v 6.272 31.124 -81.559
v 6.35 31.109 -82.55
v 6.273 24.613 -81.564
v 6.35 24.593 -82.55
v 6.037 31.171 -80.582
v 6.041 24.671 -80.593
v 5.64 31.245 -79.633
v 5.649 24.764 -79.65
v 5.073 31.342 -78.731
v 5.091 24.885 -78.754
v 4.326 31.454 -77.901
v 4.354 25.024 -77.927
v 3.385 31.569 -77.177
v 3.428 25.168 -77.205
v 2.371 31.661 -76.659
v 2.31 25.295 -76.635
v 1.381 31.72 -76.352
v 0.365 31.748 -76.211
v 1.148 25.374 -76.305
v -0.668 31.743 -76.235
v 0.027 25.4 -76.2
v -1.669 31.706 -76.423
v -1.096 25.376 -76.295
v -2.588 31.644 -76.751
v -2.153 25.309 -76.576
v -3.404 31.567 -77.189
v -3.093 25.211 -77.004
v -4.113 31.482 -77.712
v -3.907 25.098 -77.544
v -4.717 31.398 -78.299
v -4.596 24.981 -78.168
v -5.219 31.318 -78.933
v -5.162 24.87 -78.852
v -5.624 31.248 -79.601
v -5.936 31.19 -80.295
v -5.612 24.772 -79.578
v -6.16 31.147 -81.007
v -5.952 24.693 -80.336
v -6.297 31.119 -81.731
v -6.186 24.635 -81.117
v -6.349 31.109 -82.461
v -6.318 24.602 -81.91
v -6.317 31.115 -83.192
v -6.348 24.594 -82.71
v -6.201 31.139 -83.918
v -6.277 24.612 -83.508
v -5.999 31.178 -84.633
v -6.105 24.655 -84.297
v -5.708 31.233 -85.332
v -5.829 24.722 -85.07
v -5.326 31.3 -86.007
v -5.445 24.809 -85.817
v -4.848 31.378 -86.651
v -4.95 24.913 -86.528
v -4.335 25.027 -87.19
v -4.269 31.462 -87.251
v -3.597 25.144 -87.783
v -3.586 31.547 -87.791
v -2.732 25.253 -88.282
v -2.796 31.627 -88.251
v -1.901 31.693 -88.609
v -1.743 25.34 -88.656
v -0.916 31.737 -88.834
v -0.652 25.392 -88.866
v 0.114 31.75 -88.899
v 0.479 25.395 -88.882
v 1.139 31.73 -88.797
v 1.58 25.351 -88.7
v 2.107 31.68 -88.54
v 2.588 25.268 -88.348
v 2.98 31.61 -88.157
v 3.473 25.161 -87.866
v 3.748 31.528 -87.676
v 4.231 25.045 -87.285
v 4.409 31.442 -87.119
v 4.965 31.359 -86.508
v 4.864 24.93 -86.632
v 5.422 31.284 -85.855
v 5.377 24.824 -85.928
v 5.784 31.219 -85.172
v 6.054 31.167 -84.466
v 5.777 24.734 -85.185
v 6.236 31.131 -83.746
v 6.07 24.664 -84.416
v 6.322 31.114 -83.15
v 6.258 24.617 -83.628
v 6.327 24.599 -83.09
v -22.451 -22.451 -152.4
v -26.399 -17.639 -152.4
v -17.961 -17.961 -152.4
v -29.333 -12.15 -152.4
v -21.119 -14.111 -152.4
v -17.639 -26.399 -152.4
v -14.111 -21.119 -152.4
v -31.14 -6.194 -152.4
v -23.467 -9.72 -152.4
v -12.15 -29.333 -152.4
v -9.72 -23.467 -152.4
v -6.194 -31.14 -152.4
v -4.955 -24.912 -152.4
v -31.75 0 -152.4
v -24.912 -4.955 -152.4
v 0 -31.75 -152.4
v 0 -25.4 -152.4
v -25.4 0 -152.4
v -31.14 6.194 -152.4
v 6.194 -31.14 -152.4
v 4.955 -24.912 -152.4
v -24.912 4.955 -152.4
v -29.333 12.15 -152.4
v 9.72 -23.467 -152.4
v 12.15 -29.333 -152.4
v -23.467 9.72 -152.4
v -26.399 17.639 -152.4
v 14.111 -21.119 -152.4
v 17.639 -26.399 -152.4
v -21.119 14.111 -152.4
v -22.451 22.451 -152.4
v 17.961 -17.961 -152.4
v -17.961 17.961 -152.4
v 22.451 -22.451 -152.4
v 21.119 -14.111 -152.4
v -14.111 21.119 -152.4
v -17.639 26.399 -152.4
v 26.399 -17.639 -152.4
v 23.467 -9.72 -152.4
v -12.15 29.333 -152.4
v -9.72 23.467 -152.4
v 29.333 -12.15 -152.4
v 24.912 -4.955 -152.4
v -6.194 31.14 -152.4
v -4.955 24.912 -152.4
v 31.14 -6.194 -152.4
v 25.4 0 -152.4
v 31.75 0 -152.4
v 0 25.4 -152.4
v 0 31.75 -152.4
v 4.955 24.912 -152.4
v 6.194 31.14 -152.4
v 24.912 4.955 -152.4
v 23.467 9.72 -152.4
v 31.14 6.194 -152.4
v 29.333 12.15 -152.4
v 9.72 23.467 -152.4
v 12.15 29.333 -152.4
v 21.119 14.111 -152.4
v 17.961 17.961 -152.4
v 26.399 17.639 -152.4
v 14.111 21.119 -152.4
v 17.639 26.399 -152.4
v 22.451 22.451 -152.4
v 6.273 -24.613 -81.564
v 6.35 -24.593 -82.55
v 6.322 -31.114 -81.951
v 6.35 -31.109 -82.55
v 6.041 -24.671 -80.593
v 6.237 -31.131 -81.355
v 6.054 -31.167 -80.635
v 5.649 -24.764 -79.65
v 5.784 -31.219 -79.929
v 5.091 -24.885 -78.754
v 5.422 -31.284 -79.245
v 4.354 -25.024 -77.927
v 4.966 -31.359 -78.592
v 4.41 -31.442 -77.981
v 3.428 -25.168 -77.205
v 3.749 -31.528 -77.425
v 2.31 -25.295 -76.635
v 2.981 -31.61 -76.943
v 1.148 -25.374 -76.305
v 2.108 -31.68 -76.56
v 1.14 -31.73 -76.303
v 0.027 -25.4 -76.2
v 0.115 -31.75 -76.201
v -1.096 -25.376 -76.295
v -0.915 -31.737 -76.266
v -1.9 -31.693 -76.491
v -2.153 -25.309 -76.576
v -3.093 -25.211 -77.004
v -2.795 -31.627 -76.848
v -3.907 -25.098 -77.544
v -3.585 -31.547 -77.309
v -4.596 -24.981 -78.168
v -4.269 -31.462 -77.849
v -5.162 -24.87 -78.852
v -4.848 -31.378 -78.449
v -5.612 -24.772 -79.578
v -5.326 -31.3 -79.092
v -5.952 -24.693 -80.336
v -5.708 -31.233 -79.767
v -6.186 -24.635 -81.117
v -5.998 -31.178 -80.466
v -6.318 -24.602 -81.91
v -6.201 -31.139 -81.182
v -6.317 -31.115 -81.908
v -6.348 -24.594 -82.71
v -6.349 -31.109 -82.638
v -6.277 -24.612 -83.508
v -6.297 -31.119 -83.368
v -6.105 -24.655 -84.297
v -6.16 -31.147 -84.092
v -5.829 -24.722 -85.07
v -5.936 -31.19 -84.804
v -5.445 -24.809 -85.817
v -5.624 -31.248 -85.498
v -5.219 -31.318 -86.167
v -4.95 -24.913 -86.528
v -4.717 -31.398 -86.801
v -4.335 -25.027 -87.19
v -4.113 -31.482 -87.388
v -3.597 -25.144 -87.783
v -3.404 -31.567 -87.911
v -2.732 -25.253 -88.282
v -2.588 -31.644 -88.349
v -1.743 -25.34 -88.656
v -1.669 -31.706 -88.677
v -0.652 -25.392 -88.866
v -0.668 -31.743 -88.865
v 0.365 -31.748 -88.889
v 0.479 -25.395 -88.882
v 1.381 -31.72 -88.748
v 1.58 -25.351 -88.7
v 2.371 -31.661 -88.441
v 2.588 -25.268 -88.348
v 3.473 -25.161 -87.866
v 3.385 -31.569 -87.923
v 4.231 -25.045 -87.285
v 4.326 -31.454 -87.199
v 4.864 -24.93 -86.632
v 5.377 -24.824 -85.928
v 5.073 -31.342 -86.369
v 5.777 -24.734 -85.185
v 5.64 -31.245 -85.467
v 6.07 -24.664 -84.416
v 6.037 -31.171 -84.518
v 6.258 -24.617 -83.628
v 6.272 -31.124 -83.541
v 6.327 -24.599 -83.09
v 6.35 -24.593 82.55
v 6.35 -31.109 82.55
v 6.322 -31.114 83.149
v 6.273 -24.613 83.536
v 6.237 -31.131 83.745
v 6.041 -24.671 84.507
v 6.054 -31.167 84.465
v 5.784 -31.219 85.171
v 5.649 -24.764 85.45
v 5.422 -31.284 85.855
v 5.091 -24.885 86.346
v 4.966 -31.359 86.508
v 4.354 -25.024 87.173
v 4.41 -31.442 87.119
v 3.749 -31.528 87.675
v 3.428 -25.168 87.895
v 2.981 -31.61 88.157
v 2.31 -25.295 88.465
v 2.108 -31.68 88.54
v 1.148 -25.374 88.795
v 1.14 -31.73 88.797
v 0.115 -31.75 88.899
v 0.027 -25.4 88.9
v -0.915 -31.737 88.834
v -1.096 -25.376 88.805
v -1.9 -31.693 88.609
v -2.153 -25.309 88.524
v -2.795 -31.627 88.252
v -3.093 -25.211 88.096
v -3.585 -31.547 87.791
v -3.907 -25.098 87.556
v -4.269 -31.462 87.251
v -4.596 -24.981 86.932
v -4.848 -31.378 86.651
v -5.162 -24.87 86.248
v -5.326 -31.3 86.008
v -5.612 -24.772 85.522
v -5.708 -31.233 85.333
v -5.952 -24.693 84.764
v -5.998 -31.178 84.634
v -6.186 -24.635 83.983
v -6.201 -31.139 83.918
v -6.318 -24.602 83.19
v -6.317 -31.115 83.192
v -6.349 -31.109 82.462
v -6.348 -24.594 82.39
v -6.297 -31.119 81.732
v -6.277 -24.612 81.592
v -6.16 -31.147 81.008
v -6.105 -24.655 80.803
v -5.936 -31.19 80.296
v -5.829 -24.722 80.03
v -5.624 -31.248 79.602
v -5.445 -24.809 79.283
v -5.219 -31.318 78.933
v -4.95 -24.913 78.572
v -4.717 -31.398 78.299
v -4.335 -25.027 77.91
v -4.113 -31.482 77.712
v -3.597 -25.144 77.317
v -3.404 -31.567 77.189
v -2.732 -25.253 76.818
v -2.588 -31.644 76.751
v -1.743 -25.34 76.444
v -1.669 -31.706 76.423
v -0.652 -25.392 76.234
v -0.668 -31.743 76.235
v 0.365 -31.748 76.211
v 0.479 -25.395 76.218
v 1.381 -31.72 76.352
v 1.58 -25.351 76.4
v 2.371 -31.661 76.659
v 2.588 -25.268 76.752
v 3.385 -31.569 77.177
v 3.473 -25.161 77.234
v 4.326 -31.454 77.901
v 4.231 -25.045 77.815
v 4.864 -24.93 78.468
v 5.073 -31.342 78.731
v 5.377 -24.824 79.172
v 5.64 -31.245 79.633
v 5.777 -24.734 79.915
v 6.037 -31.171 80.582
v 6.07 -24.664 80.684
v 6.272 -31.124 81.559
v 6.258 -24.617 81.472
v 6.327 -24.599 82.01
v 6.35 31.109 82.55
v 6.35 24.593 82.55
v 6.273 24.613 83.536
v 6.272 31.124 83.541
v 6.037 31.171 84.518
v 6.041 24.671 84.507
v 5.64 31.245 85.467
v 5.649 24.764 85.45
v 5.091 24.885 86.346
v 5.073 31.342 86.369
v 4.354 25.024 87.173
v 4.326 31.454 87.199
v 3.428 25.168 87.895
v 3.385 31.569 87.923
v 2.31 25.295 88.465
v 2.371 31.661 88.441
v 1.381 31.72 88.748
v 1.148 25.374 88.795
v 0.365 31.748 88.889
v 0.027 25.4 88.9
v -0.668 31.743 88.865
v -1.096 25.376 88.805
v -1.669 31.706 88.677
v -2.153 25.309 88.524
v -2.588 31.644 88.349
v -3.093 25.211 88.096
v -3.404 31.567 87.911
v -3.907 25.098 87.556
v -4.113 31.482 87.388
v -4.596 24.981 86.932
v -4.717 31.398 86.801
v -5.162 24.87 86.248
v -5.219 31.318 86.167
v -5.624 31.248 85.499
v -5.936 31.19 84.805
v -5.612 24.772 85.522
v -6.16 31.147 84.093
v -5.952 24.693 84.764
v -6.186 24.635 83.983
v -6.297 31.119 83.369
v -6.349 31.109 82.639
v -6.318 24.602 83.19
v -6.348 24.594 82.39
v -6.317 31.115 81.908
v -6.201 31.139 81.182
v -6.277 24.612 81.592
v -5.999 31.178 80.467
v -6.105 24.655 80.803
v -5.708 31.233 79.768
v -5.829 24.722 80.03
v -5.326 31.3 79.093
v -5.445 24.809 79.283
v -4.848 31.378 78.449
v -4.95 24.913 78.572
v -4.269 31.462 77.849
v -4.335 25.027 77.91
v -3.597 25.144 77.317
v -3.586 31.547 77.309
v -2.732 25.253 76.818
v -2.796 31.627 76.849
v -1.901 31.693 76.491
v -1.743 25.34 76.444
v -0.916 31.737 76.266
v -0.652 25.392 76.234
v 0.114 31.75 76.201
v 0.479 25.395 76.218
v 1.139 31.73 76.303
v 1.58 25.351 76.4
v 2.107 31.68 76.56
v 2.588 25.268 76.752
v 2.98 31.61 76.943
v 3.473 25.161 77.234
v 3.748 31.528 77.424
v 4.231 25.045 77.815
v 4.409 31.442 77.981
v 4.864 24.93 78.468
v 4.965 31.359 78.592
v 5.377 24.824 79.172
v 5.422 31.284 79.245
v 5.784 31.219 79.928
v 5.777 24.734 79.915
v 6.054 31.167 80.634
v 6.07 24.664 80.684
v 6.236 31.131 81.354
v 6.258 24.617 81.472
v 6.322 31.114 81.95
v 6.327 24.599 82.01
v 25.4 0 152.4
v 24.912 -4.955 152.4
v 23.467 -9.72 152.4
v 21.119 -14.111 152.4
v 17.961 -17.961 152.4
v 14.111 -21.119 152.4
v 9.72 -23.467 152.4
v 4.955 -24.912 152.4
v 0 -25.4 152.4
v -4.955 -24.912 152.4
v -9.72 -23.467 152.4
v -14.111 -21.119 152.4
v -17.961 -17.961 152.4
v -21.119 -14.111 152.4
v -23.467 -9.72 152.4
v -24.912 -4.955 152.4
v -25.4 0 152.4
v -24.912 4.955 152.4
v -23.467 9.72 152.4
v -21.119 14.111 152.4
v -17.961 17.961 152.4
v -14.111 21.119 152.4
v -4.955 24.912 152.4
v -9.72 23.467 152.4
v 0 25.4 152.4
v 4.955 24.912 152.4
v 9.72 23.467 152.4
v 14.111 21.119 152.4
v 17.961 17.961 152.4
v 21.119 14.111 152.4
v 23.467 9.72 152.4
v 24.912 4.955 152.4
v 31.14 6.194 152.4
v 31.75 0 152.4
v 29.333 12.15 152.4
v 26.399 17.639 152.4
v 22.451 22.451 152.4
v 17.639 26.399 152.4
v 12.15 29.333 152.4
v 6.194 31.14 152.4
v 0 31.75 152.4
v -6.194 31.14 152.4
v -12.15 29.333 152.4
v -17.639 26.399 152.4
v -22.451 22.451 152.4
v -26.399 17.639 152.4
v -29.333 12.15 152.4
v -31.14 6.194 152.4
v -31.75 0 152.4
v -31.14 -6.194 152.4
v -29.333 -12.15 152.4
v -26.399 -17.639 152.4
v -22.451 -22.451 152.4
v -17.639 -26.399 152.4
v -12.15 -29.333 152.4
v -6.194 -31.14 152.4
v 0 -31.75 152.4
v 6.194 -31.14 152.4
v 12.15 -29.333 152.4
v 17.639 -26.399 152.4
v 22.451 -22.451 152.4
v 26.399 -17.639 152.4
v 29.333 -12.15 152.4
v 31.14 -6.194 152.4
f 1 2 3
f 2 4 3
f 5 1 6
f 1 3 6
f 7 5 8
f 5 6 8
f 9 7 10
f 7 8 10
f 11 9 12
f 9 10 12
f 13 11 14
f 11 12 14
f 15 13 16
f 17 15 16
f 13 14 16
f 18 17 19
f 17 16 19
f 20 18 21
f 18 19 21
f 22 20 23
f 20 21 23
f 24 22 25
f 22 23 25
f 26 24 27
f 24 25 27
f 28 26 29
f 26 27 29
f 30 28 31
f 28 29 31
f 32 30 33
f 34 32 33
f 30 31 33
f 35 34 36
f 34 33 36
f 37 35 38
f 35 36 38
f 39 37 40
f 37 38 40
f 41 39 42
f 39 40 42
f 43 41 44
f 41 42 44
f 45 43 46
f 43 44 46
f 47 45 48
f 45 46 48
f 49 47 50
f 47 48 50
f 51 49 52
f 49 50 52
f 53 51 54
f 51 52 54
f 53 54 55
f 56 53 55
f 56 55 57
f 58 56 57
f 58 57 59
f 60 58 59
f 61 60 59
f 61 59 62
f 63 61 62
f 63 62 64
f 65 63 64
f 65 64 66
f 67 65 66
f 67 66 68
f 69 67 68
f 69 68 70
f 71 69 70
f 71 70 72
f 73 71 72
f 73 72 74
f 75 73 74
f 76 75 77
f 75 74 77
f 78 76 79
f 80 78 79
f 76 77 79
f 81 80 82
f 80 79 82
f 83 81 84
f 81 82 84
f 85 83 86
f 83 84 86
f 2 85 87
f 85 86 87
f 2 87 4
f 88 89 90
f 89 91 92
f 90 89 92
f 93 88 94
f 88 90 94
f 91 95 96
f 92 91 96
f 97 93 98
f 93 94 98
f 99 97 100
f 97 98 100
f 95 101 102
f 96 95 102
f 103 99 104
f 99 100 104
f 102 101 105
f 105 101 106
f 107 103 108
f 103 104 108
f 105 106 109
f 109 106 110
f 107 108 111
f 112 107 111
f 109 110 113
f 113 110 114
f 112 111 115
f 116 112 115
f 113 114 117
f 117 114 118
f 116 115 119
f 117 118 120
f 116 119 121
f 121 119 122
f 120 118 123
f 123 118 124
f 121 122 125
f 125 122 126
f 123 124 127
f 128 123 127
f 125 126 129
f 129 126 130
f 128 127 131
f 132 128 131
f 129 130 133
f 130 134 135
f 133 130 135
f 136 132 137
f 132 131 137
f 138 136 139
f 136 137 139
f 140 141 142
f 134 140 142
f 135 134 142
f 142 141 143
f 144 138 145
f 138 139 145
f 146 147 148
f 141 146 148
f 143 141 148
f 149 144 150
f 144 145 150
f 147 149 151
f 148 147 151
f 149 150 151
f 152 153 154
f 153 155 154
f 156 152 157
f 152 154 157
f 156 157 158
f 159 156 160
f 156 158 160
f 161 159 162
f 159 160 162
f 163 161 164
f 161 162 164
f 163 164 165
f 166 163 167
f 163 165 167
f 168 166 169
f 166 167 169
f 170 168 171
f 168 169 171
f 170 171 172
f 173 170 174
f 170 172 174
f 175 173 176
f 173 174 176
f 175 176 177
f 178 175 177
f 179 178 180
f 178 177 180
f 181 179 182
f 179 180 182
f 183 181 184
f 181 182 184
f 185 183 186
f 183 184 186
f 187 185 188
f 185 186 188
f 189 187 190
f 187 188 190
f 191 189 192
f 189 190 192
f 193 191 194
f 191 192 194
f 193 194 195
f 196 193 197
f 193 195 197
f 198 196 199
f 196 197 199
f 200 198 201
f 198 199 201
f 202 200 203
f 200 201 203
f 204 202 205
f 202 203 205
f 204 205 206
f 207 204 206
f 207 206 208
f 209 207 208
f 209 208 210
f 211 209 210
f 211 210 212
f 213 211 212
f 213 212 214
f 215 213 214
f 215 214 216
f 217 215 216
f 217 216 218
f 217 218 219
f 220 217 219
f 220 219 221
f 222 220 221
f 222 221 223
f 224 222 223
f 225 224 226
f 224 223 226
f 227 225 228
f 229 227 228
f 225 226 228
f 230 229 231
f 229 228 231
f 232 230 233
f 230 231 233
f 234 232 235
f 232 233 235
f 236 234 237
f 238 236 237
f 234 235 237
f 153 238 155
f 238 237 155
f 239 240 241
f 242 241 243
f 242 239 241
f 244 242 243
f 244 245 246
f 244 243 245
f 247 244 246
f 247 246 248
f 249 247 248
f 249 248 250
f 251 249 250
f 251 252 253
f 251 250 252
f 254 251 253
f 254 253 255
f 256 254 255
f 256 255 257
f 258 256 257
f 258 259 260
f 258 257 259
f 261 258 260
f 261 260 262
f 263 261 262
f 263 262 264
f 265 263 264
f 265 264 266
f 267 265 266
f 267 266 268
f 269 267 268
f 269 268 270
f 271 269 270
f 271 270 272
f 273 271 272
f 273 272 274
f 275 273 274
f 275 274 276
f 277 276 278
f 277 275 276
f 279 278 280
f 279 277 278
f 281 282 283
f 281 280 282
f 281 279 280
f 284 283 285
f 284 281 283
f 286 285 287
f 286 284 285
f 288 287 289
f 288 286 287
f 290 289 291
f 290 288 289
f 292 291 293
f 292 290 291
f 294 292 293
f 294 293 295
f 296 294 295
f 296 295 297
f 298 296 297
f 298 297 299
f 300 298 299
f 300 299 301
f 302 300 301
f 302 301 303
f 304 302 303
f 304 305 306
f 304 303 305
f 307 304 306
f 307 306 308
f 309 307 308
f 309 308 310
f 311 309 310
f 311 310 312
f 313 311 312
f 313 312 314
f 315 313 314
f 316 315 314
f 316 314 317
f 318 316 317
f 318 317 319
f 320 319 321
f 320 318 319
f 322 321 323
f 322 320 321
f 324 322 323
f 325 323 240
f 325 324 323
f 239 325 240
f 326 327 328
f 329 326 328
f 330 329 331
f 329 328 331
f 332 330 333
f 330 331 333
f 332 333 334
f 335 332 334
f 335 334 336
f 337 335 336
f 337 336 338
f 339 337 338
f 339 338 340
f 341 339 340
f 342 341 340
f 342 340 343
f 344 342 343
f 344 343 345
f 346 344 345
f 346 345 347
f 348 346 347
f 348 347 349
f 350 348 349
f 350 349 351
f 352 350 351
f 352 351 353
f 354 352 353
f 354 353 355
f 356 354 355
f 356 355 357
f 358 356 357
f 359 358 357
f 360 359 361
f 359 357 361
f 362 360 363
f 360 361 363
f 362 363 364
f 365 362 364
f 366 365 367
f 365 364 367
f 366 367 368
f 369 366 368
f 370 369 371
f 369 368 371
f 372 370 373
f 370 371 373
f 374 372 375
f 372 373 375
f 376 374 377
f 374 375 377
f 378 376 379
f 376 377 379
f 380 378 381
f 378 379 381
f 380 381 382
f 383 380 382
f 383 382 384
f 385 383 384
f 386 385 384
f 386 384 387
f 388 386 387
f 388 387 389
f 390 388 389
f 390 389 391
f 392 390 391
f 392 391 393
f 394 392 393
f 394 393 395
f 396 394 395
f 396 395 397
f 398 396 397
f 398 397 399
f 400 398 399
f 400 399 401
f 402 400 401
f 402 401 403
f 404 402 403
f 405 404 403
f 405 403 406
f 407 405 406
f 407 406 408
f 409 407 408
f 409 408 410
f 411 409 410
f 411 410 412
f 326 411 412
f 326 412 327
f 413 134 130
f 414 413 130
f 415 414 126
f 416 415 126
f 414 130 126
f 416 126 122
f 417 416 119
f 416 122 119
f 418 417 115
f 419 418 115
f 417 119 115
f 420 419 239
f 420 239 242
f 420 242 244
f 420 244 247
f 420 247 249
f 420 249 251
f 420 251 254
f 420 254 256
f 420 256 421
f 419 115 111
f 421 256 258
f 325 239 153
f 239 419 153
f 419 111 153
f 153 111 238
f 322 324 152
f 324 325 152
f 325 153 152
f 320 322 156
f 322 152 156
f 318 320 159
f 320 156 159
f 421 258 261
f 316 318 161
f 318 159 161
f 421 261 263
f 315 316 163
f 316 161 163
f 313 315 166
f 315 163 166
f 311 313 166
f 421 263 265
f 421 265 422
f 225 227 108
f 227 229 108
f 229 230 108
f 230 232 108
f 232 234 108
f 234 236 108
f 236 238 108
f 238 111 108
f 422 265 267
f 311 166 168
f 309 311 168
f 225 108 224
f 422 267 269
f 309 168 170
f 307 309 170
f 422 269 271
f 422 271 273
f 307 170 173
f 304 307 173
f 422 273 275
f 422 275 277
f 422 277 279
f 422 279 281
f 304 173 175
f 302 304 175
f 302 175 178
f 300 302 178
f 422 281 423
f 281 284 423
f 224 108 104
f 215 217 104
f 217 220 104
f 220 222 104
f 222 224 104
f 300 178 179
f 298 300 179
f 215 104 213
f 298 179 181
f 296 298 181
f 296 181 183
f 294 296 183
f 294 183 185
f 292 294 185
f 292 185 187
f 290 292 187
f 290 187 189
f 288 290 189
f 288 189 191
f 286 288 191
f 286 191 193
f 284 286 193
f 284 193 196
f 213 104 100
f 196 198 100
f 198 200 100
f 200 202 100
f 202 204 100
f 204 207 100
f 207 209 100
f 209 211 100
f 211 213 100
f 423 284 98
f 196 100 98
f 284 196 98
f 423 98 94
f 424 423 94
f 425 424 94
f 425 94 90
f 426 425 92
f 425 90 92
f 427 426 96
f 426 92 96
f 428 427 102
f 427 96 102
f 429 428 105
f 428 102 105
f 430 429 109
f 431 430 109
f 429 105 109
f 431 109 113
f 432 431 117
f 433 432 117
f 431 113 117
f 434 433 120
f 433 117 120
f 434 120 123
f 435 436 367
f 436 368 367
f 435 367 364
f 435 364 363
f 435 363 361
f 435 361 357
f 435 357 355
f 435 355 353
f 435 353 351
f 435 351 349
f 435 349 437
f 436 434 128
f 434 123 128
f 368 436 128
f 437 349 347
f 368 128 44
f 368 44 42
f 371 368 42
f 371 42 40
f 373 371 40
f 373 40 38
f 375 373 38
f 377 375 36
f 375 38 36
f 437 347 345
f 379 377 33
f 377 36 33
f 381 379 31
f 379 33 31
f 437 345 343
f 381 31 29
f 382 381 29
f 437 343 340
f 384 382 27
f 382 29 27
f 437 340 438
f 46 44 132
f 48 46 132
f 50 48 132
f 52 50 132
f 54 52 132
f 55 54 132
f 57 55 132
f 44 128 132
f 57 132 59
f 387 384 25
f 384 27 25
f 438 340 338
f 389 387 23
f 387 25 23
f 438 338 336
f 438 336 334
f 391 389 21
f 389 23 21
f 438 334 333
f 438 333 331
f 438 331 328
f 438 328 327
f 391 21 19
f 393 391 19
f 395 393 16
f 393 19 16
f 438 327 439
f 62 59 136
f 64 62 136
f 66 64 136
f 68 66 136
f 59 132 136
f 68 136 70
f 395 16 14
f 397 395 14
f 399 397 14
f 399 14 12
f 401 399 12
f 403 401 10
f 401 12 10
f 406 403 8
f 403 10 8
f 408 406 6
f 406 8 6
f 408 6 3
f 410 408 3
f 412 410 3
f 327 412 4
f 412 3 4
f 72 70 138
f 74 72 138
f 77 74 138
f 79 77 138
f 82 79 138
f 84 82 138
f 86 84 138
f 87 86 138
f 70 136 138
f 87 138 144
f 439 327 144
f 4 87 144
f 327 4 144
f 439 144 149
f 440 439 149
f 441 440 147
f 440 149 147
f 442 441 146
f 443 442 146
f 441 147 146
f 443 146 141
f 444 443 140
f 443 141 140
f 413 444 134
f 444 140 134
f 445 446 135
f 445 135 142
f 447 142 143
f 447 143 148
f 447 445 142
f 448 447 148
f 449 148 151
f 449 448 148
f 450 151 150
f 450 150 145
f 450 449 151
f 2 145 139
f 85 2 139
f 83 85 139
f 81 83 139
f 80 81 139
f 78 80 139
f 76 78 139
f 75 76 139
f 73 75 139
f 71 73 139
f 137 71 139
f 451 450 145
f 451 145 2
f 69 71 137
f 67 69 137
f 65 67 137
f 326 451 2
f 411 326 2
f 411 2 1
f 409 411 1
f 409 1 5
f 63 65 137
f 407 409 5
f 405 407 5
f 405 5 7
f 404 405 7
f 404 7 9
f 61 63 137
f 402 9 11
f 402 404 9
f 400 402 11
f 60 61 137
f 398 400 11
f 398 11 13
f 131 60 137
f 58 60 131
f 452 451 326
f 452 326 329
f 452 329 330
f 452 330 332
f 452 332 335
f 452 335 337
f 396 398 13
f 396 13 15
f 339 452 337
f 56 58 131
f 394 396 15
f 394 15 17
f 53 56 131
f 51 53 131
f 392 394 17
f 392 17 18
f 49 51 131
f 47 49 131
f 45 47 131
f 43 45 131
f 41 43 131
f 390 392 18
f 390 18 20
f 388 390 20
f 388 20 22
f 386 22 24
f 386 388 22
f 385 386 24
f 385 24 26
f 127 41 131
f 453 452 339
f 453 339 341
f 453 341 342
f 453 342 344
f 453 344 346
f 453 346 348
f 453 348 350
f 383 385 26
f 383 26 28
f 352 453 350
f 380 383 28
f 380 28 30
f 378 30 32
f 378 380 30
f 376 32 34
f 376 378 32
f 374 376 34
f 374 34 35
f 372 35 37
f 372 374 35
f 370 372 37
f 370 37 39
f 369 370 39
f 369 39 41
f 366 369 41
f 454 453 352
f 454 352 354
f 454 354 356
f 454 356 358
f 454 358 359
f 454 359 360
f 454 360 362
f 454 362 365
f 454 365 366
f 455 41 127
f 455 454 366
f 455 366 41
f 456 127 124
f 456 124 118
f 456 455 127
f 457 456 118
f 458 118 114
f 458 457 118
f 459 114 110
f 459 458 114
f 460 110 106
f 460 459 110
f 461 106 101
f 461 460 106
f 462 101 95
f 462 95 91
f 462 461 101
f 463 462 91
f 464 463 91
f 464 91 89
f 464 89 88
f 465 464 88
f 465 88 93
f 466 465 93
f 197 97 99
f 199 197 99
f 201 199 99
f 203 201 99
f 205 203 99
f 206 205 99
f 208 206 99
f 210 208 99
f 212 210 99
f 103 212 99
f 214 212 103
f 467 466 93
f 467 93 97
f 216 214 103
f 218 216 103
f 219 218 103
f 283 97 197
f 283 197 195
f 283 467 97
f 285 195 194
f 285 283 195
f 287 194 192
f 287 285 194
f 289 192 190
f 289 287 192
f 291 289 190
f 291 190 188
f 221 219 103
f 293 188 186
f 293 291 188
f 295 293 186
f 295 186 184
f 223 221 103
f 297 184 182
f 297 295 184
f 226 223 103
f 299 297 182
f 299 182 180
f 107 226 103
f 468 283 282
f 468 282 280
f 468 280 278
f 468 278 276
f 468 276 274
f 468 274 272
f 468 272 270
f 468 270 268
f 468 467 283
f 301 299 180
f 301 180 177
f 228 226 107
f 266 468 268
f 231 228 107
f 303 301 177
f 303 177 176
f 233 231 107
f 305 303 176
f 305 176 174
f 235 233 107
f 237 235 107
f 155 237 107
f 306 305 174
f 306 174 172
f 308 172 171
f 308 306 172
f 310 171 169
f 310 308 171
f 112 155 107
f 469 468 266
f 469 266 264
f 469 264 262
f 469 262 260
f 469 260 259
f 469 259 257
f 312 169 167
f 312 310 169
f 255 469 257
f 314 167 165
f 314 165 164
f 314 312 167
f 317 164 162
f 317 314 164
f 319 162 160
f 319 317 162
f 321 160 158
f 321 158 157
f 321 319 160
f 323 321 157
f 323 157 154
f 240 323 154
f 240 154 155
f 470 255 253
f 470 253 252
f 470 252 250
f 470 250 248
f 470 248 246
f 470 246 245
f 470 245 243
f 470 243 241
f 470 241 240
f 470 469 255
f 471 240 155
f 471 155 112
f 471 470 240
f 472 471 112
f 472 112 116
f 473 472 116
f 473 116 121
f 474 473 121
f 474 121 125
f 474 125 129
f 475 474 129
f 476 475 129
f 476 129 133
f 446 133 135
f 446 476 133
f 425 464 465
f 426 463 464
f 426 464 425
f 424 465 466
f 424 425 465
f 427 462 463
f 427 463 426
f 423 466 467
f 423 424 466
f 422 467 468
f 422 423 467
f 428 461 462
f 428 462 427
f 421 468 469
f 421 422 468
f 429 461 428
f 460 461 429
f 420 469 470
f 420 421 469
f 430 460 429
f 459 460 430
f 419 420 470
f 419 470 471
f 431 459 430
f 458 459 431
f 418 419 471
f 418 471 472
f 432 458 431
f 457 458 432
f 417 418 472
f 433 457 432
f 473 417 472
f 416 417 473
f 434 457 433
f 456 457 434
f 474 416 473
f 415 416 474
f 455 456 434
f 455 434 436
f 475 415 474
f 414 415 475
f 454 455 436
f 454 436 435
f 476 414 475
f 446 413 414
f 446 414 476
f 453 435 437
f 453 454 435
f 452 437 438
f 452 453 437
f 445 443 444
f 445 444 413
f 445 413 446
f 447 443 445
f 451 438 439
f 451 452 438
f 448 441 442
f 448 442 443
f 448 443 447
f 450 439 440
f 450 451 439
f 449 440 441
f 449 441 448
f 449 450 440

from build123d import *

# Parameters (mm, degrees)
F0_R     = 31.75
F1_DEPTH = 152.4
F2_R     = 25.4
F3_DEPTH = 304.8
F4_R     = 6.35
F5_DEPTH = 31.75


with BuildPart() as f1:
    # F0 (on Top) → F1 (new body, symmetric)
    with BuildSketch(Plane.XY):
        Circle(F0_R)
    extrude(amount=F1_DEPTH, both=True)

    # F2 (on face) → F3 (cut)
    with BuildSketch(Plane(origin=(0, 0, -152.4), x_dir=(1, 0, 0), z_dir=(0, 0, -1))):
        Circle(F2_R)
    extrude(amount=-F3_DEPTH, mode=Mode.SUBTRACT)

    # F4 (on Front) → F5 (cut, symmetric)
    with BuildSketch(Plane.XZ):
        with Locations((0, 82.55)):
            Circle(F4_R)
        with Locations((0, -82.55)):
            Circle(F4_R)
    extrude(amount=F5_DEPTH, both=True, mode=Mode.SUBTRACT)


solid = f1.part
